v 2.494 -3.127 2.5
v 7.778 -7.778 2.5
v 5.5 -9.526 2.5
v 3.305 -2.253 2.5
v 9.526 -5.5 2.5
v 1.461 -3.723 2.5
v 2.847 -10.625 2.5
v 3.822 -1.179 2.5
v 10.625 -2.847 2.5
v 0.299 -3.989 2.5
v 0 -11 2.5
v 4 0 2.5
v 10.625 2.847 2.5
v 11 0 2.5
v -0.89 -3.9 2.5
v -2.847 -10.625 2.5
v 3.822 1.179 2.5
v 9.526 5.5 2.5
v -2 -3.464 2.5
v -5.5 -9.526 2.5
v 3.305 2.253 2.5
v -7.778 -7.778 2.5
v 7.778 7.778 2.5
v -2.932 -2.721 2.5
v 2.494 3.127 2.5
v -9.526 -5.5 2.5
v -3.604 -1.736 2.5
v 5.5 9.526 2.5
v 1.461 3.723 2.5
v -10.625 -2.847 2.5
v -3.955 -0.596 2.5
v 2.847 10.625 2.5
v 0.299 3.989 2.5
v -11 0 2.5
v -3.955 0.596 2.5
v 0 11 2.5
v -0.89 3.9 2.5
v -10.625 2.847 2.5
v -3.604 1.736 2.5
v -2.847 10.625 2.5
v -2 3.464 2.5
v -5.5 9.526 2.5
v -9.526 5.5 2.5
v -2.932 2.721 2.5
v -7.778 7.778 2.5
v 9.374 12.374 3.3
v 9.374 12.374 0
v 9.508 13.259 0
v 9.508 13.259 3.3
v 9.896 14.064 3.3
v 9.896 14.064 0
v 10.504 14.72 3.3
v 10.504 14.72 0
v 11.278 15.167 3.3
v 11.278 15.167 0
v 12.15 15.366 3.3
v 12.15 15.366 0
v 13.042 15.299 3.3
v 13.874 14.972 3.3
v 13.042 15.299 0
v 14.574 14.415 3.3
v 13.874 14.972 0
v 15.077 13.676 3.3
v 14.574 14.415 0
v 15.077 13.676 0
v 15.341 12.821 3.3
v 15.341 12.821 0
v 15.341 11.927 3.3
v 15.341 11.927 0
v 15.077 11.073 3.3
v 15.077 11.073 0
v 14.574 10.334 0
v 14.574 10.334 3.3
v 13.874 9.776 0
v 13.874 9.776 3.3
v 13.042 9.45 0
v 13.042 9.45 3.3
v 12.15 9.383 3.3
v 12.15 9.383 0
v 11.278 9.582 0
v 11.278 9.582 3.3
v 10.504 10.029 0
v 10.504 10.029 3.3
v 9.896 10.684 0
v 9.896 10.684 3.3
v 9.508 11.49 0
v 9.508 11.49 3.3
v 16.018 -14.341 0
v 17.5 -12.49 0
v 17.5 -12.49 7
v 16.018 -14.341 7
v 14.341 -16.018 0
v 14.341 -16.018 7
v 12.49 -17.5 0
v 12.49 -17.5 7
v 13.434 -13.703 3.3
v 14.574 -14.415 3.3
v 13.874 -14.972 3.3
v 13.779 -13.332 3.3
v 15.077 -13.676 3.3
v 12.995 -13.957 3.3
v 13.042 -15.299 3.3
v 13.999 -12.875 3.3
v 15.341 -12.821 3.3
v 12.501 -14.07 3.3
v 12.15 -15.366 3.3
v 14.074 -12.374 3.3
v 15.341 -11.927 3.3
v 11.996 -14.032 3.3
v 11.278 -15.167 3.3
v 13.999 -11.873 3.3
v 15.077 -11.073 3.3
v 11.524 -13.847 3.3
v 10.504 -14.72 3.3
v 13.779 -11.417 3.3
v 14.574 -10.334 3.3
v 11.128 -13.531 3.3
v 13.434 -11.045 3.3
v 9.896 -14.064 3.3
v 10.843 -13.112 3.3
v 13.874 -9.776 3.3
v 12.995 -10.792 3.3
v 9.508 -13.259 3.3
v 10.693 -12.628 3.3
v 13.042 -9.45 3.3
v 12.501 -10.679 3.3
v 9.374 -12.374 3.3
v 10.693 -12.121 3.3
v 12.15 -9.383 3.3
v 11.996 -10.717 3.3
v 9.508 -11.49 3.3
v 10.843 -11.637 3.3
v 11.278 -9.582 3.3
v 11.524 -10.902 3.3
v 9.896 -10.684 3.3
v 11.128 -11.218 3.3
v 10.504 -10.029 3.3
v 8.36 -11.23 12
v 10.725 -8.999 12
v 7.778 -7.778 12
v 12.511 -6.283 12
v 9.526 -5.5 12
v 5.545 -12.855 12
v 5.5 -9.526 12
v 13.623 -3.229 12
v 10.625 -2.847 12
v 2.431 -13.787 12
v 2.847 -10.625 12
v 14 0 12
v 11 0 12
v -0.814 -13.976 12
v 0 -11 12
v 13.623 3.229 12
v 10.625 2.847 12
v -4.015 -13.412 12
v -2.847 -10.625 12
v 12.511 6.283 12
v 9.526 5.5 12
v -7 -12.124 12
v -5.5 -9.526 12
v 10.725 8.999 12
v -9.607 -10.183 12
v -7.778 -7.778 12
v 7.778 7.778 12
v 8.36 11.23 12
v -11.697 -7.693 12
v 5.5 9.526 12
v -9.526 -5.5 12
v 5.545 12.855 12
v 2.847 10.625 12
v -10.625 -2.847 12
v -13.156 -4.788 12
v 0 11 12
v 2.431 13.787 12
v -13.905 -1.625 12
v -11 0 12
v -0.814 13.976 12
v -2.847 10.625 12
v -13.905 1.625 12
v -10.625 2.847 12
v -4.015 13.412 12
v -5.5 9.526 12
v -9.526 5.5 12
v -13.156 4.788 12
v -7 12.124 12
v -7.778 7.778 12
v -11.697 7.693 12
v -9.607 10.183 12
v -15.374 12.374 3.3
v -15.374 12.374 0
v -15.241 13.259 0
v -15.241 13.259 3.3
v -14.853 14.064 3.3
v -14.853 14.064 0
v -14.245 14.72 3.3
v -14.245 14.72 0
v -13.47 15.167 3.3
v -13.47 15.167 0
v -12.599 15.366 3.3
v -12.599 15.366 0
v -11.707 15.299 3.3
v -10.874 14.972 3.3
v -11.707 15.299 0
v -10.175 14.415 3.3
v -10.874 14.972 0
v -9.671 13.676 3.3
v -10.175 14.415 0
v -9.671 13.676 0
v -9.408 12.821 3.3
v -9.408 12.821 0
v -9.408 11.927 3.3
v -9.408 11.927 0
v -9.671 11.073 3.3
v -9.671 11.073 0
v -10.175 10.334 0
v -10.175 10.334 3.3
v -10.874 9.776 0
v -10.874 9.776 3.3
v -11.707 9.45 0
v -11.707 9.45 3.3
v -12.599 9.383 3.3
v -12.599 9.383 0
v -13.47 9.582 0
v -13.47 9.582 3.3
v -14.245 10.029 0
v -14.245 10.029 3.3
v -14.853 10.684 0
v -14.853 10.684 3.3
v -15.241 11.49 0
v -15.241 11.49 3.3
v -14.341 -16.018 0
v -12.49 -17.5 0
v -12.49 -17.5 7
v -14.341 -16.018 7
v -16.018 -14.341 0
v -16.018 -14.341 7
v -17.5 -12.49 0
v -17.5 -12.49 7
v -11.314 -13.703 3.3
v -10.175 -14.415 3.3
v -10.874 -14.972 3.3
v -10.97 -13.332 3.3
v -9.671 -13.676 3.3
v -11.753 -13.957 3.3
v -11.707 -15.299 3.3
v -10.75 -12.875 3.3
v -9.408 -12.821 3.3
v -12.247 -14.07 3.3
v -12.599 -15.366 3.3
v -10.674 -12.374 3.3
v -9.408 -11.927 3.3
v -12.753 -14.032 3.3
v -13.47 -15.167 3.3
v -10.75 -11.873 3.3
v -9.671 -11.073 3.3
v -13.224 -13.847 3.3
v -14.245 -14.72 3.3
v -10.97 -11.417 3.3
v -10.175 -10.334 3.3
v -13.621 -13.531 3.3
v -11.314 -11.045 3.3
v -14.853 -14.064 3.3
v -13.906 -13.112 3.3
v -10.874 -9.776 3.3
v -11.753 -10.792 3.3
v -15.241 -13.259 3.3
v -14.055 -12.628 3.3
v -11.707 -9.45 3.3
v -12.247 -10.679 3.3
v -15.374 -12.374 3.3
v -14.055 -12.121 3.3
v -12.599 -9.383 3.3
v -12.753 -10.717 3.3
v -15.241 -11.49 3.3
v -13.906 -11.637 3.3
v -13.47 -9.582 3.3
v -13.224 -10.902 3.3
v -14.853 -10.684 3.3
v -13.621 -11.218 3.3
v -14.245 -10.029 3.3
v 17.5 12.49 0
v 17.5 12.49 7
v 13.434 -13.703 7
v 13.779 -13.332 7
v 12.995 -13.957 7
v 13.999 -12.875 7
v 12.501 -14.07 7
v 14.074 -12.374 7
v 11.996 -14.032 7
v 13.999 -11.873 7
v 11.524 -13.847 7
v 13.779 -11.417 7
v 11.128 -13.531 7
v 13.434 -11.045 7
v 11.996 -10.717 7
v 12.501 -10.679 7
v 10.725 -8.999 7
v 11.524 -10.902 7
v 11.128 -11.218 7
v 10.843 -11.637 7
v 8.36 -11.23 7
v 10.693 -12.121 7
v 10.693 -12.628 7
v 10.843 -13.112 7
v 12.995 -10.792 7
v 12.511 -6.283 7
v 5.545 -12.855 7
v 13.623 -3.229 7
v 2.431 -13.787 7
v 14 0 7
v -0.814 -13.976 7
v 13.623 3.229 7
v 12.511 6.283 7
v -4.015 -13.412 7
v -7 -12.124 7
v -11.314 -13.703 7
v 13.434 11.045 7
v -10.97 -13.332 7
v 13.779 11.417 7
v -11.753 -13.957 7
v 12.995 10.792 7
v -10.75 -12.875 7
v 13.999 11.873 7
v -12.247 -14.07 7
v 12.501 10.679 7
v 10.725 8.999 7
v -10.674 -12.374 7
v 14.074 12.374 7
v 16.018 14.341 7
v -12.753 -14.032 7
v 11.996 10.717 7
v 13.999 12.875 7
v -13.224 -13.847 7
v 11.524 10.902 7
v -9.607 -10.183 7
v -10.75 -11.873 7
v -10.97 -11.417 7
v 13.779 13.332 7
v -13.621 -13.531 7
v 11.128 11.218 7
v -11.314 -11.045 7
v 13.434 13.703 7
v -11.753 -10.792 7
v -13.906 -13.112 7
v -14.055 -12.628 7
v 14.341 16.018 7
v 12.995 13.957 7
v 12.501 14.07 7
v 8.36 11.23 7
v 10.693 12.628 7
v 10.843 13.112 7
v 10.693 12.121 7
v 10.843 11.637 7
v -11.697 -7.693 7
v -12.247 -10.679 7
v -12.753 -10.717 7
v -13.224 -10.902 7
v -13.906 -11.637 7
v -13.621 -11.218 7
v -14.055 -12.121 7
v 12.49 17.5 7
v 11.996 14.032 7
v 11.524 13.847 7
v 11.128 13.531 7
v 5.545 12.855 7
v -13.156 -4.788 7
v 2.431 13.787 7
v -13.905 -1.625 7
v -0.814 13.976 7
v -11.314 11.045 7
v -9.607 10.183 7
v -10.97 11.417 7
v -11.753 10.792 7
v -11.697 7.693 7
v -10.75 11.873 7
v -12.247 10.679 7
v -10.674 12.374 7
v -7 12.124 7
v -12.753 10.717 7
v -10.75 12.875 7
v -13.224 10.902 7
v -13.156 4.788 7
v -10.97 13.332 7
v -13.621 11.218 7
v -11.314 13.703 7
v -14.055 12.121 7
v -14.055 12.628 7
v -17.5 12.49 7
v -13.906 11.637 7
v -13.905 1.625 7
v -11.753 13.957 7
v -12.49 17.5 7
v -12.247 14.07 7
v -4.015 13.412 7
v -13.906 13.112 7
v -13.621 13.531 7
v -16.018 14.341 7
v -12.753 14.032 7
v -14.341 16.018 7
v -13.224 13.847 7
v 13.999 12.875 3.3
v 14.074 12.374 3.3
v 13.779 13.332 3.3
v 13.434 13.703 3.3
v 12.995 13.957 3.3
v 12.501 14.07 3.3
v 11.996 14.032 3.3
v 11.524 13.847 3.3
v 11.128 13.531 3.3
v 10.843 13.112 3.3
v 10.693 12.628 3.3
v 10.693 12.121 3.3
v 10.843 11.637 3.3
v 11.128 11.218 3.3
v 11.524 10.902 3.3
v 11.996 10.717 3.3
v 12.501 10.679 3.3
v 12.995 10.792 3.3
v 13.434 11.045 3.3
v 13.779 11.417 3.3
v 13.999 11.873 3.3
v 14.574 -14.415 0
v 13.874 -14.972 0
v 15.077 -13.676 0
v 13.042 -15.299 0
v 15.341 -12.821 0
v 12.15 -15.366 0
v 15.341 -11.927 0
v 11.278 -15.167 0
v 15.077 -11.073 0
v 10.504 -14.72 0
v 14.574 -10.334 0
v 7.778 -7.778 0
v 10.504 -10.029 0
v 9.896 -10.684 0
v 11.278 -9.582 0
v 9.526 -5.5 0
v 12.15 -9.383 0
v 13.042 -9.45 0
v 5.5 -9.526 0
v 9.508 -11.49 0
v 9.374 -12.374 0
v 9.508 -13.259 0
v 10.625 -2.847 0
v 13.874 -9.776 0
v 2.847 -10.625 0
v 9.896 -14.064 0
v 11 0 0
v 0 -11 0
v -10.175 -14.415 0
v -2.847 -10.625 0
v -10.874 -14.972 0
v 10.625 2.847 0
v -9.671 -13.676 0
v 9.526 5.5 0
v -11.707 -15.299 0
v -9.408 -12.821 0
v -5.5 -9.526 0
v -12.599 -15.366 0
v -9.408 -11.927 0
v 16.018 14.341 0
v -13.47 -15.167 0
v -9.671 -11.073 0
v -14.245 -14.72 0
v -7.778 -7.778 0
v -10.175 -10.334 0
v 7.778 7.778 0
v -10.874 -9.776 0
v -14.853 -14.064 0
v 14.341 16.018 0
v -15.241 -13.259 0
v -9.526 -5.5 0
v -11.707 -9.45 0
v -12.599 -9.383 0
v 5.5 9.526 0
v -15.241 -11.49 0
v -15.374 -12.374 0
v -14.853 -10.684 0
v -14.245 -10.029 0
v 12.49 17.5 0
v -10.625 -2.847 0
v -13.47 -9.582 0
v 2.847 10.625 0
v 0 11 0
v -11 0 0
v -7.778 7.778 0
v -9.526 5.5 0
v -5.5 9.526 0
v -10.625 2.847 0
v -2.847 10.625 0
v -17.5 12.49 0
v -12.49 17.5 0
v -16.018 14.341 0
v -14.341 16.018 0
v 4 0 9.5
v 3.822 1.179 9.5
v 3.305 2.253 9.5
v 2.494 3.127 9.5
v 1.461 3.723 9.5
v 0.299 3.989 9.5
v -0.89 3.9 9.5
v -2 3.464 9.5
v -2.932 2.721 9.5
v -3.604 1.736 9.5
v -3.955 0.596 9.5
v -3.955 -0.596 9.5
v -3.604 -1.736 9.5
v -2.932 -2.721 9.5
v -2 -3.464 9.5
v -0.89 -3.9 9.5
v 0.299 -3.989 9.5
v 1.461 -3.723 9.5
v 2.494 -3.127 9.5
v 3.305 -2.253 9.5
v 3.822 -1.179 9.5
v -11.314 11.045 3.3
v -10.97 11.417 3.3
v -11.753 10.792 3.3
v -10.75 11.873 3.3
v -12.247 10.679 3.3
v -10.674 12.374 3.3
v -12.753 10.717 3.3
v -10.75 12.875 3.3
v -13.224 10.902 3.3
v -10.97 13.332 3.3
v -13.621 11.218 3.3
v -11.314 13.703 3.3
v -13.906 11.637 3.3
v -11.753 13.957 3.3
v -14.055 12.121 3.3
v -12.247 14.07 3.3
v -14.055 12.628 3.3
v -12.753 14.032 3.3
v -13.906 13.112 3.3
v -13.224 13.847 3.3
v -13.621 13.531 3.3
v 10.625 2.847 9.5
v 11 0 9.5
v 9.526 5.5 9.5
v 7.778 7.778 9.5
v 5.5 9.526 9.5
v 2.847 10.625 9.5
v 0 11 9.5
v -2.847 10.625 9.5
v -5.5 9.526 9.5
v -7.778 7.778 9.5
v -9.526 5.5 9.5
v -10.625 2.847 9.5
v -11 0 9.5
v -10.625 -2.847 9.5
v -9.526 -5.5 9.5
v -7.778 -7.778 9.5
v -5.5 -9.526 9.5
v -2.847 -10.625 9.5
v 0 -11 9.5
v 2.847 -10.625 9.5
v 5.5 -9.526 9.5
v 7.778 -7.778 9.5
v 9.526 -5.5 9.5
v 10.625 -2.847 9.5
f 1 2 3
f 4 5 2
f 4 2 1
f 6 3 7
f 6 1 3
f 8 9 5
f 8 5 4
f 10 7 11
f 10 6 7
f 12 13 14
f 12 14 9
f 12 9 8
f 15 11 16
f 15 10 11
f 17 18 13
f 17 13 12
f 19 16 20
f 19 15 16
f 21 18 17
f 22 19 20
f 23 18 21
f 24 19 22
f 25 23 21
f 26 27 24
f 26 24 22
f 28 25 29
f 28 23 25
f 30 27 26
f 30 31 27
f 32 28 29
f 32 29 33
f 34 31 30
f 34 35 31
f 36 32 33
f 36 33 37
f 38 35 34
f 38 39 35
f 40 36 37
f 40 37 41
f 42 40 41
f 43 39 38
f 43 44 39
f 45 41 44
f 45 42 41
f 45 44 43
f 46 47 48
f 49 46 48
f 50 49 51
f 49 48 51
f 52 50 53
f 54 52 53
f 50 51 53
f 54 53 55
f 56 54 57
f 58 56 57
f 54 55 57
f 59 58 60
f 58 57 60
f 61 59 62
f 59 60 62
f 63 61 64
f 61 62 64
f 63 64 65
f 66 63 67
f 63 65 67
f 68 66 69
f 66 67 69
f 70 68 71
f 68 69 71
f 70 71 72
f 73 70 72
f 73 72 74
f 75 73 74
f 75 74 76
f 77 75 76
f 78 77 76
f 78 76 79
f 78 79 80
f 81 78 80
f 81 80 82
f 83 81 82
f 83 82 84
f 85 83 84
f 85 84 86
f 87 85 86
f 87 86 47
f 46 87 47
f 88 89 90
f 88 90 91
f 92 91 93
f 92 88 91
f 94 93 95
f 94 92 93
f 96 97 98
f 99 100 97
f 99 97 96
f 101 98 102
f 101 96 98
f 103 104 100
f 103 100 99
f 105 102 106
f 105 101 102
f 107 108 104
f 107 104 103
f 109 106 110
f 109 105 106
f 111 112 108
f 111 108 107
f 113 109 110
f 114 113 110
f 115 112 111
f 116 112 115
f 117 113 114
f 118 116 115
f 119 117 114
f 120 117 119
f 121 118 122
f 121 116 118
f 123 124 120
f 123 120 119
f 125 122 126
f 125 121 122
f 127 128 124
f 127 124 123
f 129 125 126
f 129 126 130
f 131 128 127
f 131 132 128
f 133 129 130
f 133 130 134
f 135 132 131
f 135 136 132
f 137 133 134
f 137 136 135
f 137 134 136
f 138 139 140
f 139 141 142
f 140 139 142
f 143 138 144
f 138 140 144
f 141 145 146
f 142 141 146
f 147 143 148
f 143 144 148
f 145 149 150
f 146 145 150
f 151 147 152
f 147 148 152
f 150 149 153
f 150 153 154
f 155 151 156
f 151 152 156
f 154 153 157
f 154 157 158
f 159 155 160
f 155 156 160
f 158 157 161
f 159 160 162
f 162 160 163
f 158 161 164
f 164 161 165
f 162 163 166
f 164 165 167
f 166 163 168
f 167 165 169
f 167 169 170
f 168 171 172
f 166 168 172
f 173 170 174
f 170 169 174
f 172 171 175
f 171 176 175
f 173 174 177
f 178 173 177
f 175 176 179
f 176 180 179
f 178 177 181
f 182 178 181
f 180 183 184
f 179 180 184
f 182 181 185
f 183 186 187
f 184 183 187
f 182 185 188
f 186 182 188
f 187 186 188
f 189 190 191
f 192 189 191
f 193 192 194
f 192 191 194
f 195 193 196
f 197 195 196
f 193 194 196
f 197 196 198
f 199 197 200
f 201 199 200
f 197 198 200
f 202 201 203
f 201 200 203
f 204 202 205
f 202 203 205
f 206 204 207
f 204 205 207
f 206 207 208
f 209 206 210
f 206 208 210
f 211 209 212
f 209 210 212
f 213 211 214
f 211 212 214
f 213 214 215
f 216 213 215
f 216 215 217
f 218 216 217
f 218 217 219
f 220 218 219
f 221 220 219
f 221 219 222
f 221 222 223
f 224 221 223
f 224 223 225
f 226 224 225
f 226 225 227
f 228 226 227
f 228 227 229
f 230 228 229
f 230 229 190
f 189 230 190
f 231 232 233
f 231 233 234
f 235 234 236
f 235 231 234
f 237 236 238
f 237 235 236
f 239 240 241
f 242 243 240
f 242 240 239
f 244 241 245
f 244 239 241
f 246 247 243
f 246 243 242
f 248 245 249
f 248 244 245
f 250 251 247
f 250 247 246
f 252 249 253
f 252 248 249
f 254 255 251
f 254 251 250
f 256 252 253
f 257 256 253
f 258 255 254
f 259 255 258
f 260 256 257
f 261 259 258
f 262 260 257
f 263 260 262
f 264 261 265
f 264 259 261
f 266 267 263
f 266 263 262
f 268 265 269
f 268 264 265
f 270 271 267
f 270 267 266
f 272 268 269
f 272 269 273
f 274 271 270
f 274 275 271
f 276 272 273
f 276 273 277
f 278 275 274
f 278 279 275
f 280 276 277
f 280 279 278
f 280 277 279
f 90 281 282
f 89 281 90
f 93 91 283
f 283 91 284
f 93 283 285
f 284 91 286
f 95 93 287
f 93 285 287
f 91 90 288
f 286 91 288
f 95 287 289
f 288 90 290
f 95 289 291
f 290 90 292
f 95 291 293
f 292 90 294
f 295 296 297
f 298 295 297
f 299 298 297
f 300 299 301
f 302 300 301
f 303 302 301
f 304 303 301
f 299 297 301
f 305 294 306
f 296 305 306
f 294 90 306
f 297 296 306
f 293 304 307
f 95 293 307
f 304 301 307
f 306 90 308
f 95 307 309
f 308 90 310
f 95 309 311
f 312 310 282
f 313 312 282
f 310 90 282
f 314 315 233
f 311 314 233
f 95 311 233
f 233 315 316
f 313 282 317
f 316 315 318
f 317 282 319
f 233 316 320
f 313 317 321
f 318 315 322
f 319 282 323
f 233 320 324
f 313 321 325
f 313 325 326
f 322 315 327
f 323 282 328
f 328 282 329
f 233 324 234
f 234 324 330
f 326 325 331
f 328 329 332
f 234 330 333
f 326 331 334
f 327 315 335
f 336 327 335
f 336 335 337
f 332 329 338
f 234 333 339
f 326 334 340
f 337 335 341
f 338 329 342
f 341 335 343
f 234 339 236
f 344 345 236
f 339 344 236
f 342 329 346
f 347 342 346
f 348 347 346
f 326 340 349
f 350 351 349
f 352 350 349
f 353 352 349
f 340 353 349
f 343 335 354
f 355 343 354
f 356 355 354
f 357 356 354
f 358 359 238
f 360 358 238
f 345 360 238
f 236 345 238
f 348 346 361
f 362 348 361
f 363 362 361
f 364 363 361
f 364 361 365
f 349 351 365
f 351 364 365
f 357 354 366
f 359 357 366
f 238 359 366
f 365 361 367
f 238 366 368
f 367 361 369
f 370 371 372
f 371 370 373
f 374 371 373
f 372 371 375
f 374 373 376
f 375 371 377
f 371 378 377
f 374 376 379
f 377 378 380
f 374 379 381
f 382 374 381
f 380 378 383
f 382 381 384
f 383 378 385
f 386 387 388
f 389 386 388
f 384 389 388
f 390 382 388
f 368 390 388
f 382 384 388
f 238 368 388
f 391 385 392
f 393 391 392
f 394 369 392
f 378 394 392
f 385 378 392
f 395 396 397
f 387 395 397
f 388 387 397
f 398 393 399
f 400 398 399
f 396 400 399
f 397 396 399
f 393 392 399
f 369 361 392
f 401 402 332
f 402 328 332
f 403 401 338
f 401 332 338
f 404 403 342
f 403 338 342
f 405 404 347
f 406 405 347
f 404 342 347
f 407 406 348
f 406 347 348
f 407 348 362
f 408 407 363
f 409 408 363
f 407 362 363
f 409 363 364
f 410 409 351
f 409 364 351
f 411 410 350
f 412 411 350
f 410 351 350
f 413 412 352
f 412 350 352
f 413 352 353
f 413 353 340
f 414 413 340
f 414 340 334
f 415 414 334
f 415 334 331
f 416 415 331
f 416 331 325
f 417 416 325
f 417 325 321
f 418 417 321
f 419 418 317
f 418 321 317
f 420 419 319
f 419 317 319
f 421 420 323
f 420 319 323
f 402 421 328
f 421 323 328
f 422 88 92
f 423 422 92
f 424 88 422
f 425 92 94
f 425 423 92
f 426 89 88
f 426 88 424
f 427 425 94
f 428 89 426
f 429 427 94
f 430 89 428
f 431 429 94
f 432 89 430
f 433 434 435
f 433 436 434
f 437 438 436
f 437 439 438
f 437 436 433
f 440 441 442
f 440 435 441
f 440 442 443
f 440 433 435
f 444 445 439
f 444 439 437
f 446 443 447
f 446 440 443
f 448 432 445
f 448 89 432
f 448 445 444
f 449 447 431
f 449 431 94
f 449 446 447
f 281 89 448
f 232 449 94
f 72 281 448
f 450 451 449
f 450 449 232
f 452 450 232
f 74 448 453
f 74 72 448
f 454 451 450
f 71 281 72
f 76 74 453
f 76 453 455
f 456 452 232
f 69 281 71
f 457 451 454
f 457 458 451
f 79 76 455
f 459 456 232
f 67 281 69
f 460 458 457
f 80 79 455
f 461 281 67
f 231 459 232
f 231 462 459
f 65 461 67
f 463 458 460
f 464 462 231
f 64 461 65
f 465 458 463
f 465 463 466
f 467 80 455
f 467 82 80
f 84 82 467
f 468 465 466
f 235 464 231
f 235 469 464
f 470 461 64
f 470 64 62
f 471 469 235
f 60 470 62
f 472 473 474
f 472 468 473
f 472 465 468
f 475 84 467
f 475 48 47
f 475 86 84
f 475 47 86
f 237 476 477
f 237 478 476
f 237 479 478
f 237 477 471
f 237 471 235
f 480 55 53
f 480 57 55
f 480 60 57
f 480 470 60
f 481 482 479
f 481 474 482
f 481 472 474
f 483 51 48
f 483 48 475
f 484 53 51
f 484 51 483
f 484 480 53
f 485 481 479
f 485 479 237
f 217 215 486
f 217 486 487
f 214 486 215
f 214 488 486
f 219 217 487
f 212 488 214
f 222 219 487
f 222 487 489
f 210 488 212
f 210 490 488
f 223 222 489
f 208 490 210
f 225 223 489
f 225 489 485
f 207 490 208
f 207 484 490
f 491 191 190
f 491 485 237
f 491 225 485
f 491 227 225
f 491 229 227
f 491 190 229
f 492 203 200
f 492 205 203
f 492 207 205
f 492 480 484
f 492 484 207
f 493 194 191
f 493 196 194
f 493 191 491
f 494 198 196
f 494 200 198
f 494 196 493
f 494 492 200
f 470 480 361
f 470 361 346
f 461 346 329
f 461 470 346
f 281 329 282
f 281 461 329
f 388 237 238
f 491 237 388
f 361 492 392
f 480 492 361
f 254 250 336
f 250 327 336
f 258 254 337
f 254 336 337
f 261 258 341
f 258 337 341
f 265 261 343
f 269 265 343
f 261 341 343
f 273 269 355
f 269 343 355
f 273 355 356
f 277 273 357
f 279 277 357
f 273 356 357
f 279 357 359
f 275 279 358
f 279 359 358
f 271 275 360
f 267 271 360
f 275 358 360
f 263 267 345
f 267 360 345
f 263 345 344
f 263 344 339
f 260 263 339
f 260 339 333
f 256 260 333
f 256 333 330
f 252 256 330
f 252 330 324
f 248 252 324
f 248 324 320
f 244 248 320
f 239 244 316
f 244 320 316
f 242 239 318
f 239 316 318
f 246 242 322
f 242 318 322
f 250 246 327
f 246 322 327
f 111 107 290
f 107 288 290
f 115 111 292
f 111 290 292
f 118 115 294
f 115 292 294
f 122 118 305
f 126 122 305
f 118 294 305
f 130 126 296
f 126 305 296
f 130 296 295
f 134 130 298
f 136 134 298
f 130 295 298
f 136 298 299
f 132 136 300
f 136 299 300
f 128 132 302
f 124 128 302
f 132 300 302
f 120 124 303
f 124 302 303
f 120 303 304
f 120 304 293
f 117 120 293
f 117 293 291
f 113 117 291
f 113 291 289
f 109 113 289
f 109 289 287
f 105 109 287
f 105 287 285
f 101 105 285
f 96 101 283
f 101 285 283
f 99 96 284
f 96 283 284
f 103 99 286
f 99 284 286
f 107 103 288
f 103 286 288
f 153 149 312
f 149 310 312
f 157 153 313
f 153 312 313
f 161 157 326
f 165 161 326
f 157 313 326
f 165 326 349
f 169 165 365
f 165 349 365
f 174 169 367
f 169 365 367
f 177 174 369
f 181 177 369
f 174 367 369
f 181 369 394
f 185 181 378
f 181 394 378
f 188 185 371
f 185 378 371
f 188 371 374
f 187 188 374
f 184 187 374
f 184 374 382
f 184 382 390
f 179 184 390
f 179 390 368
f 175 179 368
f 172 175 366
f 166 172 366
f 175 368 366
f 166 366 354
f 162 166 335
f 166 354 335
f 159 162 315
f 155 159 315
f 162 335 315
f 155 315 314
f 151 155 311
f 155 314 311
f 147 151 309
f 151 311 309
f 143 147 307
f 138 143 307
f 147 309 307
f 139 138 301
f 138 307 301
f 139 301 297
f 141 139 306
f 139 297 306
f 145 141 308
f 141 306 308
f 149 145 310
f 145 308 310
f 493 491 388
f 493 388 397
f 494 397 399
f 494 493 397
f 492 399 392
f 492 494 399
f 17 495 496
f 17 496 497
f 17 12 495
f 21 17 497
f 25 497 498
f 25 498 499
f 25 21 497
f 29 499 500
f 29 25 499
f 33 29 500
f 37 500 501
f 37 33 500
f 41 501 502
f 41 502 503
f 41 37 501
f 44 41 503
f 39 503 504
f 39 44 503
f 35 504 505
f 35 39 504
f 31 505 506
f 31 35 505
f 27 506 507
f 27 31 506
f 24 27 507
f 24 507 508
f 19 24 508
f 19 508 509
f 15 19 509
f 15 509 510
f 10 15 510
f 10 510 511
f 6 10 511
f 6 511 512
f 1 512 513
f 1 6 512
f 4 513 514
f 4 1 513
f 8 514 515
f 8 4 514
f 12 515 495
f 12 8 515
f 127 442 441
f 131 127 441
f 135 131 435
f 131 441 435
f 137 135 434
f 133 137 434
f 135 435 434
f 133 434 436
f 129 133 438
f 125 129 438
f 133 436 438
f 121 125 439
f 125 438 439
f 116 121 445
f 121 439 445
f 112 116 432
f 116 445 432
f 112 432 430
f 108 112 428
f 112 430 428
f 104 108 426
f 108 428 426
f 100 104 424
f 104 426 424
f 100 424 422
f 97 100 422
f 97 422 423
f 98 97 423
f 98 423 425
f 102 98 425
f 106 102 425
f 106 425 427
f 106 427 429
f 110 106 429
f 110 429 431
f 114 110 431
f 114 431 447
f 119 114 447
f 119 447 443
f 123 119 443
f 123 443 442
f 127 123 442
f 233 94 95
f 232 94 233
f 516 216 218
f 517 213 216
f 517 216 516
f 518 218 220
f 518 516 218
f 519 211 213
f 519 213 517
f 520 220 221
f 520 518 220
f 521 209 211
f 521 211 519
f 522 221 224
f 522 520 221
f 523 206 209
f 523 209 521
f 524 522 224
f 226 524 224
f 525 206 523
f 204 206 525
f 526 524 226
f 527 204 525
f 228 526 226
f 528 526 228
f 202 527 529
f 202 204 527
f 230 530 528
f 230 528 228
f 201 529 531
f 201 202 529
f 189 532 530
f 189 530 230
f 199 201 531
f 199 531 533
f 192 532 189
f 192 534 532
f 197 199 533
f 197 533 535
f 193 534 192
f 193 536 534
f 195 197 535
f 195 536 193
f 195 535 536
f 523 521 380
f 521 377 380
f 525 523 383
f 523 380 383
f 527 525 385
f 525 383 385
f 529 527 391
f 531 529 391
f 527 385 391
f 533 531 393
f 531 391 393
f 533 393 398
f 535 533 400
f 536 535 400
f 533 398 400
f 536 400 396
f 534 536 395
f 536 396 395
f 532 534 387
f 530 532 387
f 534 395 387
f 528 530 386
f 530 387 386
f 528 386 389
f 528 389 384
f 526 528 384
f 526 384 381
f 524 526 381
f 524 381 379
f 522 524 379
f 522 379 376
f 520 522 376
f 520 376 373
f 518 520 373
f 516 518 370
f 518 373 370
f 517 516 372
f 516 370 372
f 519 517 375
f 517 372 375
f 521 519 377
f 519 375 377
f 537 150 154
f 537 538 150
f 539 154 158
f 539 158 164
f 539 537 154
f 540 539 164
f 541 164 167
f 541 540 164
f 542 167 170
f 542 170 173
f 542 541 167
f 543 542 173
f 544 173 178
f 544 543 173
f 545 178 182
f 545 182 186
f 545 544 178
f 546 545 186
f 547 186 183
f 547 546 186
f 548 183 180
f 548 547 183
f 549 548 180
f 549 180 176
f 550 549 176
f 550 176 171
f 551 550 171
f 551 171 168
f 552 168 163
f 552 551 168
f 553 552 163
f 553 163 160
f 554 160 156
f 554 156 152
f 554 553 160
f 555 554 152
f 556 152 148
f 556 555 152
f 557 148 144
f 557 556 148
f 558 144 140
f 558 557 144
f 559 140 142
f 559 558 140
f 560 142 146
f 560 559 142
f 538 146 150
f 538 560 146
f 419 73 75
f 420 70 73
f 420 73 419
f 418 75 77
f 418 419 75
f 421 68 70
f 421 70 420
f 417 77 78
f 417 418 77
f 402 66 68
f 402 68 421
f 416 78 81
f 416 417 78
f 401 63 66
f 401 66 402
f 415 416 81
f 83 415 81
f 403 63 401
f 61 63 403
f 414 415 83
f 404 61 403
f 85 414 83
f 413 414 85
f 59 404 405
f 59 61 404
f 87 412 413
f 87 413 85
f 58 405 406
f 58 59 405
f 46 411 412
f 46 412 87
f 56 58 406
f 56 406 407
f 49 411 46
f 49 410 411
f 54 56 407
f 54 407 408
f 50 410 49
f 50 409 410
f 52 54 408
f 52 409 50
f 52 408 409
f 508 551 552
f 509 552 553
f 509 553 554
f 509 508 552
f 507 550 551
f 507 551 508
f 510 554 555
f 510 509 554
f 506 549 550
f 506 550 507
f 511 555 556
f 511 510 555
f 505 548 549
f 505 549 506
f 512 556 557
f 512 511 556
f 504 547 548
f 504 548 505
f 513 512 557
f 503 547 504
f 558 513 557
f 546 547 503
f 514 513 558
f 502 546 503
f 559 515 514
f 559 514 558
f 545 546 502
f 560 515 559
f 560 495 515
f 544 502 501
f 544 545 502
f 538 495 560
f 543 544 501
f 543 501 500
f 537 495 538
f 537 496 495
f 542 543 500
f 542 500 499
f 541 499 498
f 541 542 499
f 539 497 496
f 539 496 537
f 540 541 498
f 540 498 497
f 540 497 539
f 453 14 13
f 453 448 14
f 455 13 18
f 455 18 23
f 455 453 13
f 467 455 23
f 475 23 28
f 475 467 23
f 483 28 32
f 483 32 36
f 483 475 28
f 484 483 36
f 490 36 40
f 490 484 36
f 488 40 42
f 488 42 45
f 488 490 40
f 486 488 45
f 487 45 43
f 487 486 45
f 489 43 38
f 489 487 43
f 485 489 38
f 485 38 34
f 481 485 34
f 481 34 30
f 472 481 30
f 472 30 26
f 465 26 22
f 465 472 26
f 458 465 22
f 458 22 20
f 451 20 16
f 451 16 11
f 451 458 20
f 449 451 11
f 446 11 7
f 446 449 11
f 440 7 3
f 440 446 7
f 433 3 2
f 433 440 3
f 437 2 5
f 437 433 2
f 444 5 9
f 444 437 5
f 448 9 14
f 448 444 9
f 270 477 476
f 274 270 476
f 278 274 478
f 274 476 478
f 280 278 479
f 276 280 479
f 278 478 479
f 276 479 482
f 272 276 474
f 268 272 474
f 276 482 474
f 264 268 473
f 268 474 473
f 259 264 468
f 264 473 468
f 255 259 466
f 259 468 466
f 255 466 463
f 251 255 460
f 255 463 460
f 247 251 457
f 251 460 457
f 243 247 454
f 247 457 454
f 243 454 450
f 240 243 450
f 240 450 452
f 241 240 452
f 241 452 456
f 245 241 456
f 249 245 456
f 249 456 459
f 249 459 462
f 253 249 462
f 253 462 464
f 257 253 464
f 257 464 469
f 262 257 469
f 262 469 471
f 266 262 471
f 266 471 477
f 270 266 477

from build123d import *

# Parameters (mm, degrees)
BOSS_EXTRU_1_DEPTH                                 = 7
ESQUISSE2_W                                        = 14
ESQUISSE2_H                                        = 5
CHAMBRAGE_POUR_VIS_T_TE_HEXAGONALE_M31_D           = 3.4
CHAMBRAGE_POUR_VIS_T_TE_HEXAGONALE_M31_DEPTH       = 12
CHAMBRAGE_POUR_VIS_T_TE_HEXAGONALE_M31_CBORE_D     = 6
CHAMBRAGE_POUR_VIS_T_TE_HEXAGONALE_M31_CBORE_DEPTH = 3.3


with BuildPart() as part:
    # Esquisse1 → Boss.-Extru.1 (new body)
    with BuildSketch(Plane(origin=(0, 0, 0), x_dir=(-1, 0, 0), z_dir=(0, 0, -1))):
        with BuildLine():
            Line((-17.5, 12.489995997), (-17.5, -12.489995997))
            ThreePointArc((-17.5, -12.489995997), (-15.202795796, -15.202795796), (-12.489995997, -17.5))
            Line((-12.489995997, -17.5), (12.489995997, -17.5))
            ThreePointArc((12.489995997, -17.5), (15.202795796, -15.202795796), (17.5, -12.489995997))
            Line((17.5, -12.489995997), (17.5, 12.489995997))
            ThreePointArc((17.5, 12.489995997), (15.202795796, 15.202795796), (12.489995997, 17.5))
            Line((12.489995997, 17.5), (-12.489995997, 17.5))
            ThreePointArc((-12.489995997, 17.5), (-15.202795796, 15.202795796), (-17.5, 12.489995997))
        make_face()
    extrude(amount=-BOSS_EXTRU_1_DEPTH)

    # Esquisse2 → Révolution1 (revolve)
    with BuildSketch(Plane(origin=(0, 0, 0), x_dir=(1, 0, 0), z_dir=(0, 1, 0))):
        with Locations((7, -9.5)):
            Rectangle(ESQUISSE2_W, ESQUISSE2_H)
    revolve(axis=Axis((0, 0, 7), (0, 0, 1)))

    # Esquisse3 → Enlèvement de matière-Révolution1 (revolve, cut)
    with BuildSketch(Plane(origin=(0, 0, 0), x_dir=(1, 0, 0), z_dir=(0, 1, 0))):
        Polygon((11, 0), (0, 0), (0, -12), (11, -12), (11, -9.5), (4, -9.5), (4, -2.5), (11, -2.5), align=None)
    revolve(axis=Axis((0, 0, 0), (0, 0, 1)), mode=Mode.SUBTRACT)

    # Chambrage pour vis à tête hexagonale M31
    with Locations(Plane(origin=(0, 0, 0), x_dir=(-1, 0, 0), z_dir=(0, 0, -1))):
        with Locations((12.374368671, 12.374368671), (-12.374368671, 12.374368671), (-12.374368671, -12.374368671), (12.374368671, -12.374368671)):
            CounterBoreHole(CHAMBRAGE_POUR_VIS_T_TE_HEXAGONALE_M31_D / 2, CHAMBRAGE_POUR_VIS_T_TE_HEXAGONALE_M31_CBORE_D / 2, CHAMBRAGE_POUR_VIS_T_TE_HEXAGONALE_M31_CBORE_DEPTH, depth=CHAMBRAGE_POUR_VIS_T_TE_HEXAGONALE_M31_DEPTH)


solid = part.part
